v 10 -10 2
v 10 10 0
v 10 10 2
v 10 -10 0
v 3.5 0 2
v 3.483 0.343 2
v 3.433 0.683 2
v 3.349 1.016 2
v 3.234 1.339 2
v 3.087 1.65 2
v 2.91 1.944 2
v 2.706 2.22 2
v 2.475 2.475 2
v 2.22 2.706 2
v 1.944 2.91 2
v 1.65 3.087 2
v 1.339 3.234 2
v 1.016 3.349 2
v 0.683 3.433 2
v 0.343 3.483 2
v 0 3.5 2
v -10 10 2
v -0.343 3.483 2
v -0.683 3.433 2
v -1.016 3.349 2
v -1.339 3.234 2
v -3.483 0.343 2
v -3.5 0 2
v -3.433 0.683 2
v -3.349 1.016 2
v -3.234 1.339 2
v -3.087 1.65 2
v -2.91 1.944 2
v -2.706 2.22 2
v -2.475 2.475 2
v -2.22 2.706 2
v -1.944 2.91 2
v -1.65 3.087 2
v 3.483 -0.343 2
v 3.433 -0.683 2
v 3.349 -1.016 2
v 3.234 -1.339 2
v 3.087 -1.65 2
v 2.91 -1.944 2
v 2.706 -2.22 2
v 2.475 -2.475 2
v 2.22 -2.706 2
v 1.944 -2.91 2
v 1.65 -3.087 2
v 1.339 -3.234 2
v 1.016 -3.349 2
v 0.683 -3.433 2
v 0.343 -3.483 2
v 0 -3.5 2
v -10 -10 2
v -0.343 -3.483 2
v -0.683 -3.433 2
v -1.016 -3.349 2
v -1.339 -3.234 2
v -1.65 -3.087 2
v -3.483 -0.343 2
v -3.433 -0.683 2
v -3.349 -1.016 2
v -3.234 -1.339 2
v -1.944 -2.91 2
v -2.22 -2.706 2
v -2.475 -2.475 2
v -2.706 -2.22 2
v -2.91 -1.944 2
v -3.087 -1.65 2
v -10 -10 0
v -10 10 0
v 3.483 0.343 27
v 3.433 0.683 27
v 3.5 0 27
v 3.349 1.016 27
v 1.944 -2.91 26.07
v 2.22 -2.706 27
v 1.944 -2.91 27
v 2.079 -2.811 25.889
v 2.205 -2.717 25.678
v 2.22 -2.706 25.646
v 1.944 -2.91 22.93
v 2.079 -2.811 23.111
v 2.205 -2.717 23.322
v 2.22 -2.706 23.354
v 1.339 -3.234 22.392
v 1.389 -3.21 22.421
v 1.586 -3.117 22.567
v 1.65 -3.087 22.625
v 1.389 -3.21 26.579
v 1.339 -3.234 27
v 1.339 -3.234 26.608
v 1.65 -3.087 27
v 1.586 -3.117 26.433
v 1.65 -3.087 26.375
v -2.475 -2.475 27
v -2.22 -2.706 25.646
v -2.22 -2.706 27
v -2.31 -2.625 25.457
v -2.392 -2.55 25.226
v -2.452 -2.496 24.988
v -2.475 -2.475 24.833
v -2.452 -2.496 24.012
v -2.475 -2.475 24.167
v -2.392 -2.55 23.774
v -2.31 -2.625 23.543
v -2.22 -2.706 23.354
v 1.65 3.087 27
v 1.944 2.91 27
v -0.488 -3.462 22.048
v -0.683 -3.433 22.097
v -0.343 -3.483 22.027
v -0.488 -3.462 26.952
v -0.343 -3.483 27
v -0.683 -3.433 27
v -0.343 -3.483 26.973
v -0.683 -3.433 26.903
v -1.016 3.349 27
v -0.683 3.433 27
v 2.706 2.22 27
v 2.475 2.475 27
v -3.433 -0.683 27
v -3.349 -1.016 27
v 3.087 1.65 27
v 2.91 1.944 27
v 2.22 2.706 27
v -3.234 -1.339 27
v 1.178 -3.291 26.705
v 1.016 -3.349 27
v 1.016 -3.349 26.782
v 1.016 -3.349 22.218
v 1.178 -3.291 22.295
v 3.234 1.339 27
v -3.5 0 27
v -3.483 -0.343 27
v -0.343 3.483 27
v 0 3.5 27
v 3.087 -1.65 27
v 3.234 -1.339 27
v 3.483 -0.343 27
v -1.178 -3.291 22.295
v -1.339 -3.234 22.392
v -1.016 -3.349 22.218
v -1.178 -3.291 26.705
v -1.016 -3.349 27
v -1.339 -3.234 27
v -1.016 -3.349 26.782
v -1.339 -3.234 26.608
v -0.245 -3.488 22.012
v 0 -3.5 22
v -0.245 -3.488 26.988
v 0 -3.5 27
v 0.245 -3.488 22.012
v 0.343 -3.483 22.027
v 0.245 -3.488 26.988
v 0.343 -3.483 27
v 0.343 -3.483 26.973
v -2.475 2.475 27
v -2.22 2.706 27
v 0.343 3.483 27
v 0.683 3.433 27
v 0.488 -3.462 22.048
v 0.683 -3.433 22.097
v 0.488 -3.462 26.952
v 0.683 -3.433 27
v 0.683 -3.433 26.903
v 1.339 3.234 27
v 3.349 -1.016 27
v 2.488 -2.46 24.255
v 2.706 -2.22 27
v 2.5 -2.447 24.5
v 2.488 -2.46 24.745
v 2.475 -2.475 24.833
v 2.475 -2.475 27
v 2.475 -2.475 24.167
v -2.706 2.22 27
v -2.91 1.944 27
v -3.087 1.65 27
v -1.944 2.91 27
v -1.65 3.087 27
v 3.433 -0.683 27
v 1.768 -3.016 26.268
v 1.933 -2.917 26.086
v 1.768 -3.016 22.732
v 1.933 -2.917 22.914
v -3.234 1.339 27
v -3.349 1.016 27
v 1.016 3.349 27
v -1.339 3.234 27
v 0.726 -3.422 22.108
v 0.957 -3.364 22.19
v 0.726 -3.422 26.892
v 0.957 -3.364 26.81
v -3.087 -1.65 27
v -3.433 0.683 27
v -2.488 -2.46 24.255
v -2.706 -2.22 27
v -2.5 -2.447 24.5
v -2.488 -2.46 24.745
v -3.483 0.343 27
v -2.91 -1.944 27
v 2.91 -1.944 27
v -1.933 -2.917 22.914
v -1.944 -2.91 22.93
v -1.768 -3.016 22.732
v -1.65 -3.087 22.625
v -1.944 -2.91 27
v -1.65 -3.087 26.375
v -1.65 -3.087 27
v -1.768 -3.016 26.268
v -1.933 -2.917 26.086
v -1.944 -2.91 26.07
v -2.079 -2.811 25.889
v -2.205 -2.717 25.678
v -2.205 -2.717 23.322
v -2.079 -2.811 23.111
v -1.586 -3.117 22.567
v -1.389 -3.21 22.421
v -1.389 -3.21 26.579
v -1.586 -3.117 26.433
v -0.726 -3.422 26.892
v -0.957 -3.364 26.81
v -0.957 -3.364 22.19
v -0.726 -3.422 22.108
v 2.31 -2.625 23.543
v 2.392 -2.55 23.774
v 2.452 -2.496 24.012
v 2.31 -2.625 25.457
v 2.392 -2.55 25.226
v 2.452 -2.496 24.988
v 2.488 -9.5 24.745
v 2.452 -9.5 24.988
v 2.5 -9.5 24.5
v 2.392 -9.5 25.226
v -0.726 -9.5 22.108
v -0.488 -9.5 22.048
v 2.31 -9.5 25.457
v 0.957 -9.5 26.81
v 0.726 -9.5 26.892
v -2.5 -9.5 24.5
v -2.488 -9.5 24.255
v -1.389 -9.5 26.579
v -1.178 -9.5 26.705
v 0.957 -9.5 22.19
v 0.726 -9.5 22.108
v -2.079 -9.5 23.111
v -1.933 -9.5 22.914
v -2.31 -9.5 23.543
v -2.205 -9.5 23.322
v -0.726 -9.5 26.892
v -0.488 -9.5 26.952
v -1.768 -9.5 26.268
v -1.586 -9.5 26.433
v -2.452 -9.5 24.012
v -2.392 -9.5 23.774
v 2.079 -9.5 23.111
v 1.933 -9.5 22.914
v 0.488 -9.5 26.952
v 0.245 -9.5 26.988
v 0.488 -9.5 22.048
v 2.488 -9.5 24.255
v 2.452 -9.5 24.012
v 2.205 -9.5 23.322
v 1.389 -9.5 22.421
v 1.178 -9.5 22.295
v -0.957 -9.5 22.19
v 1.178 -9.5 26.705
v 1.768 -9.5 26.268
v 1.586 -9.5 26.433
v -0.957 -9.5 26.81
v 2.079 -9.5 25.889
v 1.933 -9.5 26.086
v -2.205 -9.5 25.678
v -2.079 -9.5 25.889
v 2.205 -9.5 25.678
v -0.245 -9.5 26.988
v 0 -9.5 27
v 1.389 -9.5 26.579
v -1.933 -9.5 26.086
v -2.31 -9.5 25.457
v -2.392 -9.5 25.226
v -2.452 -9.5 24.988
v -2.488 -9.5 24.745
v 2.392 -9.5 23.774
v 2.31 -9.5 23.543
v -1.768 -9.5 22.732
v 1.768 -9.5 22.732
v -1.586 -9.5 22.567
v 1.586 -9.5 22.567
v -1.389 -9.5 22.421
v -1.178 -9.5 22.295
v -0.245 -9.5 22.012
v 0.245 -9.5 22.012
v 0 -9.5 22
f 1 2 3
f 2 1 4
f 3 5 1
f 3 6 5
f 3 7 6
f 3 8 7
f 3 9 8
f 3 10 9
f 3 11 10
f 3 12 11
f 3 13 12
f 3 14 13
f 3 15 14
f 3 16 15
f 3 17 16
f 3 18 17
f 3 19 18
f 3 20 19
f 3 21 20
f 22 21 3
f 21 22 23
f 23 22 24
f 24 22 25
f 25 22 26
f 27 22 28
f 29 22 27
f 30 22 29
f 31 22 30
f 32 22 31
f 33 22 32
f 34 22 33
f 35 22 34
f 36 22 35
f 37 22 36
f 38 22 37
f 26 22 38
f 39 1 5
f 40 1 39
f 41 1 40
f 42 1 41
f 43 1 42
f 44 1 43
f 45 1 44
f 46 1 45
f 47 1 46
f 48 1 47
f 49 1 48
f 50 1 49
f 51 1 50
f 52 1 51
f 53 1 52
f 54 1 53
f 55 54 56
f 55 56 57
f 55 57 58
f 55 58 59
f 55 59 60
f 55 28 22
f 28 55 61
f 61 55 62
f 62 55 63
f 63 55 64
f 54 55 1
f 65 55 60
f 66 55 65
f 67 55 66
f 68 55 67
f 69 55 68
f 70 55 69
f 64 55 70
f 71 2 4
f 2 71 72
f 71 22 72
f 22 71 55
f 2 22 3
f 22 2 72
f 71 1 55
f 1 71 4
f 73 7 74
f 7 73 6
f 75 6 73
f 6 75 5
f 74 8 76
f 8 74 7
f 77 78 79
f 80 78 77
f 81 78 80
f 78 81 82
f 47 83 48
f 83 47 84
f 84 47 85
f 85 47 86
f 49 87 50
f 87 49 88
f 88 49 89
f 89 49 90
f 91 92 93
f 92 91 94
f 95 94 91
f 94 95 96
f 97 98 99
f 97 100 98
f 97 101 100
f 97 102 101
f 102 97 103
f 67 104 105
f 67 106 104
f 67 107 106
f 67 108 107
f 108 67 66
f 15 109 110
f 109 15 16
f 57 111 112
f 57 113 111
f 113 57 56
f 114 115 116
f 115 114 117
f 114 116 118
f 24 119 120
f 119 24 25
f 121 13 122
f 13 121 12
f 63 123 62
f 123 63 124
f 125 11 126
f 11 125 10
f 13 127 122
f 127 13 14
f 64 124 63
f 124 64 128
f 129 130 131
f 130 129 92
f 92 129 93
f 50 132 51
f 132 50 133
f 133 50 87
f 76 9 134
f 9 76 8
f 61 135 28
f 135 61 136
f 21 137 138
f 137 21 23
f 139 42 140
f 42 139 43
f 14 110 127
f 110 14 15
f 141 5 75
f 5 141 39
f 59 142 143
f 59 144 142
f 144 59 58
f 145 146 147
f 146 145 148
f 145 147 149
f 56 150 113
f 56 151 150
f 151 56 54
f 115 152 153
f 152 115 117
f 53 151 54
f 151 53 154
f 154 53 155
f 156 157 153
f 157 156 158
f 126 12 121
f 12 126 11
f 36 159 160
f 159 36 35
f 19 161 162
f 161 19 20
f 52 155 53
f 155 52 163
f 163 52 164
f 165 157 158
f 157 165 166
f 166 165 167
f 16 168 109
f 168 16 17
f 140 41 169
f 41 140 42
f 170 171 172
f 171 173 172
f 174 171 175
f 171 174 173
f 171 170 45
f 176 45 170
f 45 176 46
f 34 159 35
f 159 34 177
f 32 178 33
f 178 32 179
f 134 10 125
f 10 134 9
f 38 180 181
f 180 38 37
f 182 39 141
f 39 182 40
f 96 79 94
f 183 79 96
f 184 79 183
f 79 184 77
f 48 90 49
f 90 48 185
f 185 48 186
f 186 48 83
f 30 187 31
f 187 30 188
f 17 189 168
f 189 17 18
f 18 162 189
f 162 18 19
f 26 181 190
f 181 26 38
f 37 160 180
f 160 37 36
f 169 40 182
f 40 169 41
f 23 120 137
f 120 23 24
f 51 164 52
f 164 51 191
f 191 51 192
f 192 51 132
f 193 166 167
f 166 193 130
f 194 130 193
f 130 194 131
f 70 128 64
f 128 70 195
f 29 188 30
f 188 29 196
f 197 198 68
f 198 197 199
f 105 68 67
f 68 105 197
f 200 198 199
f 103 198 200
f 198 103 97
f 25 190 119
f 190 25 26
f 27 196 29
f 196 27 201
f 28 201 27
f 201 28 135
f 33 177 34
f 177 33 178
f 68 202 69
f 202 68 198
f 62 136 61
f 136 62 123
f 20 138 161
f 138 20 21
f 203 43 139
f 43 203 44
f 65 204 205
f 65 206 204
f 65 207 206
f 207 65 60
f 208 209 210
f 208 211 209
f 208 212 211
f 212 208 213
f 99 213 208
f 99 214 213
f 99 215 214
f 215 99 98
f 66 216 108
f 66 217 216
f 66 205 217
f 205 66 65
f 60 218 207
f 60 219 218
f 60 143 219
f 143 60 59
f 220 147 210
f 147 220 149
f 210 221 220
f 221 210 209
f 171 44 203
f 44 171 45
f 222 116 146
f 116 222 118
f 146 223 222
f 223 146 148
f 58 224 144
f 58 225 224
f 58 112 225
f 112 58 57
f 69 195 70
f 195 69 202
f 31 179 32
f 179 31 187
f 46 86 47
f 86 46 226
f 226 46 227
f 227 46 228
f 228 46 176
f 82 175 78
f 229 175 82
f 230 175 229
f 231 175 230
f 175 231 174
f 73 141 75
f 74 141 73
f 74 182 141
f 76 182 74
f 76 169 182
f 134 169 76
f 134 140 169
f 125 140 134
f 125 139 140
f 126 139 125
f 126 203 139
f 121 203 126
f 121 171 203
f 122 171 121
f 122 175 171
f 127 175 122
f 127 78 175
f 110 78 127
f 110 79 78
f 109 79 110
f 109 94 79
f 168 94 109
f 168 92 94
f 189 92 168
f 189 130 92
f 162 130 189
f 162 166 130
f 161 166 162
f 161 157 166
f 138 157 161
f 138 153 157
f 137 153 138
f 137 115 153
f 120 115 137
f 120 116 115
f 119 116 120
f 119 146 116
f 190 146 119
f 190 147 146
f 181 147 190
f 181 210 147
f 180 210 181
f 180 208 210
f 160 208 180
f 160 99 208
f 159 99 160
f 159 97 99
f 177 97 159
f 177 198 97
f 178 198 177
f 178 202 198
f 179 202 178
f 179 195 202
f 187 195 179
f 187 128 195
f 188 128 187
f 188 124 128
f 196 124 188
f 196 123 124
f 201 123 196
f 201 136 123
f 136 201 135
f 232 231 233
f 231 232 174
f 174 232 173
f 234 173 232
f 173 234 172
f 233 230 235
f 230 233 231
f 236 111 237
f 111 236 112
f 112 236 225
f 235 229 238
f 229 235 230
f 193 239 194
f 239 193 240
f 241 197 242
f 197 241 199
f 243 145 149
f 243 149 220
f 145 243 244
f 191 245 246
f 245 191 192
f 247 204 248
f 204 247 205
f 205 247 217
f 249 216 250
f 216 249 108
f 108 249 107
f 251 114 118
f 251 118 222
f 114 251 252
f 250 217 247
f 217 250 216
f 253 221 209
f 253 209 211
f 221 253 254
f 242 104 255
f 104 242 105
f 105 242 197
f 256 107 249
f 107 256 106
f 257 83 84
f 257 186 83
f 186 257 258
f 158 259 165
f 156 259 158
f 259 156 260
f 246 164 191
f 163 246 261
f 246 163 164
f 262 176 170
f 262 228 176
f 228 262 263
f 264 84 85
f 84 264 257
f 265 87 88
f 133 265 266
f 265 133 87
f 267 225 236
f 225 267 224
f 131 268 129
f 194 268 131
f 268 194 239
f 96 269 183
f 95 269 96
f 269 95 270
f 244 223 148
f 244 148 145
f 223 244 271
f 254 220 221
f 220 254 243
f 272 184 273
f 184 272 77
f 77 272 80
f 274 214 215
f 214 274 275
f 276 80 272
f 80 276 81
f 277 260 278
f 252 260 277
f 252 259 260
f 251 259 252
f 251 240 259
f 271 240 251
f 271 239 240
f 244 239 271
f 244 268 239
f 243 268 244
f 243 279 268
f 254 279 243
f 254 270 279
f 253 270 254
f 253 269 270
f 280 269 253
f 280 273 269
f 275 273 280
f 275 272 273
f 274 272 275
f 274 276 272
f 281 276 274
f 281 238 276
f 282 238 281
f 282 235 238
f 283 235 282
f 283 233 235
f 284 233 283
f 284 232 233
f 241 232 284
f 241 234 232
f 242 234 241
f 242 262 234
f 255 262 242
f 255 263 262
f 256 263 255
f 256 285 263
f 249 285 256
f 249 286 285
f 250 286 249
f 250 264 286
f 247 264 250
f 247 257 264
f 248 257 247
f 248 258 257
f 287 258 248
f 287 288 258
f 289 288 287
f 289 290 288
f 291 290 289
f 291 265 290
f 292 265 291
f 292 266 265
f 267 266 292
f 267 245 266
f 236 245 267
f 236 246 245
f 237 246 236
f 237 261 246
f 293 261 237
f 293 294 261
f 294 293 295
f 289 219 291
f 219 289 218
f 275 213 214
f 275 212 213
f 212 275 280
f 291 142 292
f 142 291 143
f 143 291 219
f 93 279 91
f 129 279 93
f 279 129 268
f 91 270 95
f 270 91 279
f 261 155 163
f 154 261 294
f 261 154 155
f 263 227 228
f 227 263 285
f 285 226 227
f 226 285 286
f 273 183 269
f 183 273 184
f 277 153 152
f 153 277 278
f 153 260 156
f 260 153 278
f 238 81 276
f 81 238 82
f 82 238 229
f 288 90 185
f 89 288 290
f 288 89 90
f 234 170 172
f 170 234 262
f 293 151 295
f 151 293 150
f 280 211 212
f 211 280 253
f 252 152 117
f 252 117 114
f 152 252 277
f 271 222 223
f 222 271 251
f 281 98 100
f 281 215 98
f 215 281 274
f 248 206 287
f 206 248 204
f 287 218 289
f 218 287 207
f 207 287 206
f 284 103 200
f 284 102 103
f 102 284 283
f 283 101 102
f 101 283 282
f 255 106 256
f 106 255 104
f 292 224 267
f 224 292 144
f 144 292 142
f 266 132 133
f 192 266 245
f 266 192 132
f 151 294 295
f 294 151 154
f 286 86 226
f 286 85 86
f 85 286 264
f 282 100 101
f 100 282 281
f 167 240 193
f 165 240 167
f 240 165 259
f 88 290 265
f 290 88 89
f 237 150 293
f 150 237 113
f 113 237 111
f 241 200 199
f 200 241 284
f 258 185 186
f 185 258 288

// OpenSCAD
$fn = 64;


baseSideLength = 20;
baseHeight = 2;

rodDiameter = 7;
rodLength = 25;

pinDiameter = 5;
pinHeight = 6;
pinOffset = 20;

translate([0, 0, baseHeight / 2])
    cube([baseSideLength, baseSideLength, baseHeight], center = true);

translate([0, 0, baseHeight])
    cylinder(d = rodDiameter, h = rodLength);

translate([0, 0, baseHeight + pinDiameter / 2 + pinOffset])
    rotate([90, 0, 0])
        cylinder(d = pinDiameter, h = pinHeight + rodDiameter / 2);
